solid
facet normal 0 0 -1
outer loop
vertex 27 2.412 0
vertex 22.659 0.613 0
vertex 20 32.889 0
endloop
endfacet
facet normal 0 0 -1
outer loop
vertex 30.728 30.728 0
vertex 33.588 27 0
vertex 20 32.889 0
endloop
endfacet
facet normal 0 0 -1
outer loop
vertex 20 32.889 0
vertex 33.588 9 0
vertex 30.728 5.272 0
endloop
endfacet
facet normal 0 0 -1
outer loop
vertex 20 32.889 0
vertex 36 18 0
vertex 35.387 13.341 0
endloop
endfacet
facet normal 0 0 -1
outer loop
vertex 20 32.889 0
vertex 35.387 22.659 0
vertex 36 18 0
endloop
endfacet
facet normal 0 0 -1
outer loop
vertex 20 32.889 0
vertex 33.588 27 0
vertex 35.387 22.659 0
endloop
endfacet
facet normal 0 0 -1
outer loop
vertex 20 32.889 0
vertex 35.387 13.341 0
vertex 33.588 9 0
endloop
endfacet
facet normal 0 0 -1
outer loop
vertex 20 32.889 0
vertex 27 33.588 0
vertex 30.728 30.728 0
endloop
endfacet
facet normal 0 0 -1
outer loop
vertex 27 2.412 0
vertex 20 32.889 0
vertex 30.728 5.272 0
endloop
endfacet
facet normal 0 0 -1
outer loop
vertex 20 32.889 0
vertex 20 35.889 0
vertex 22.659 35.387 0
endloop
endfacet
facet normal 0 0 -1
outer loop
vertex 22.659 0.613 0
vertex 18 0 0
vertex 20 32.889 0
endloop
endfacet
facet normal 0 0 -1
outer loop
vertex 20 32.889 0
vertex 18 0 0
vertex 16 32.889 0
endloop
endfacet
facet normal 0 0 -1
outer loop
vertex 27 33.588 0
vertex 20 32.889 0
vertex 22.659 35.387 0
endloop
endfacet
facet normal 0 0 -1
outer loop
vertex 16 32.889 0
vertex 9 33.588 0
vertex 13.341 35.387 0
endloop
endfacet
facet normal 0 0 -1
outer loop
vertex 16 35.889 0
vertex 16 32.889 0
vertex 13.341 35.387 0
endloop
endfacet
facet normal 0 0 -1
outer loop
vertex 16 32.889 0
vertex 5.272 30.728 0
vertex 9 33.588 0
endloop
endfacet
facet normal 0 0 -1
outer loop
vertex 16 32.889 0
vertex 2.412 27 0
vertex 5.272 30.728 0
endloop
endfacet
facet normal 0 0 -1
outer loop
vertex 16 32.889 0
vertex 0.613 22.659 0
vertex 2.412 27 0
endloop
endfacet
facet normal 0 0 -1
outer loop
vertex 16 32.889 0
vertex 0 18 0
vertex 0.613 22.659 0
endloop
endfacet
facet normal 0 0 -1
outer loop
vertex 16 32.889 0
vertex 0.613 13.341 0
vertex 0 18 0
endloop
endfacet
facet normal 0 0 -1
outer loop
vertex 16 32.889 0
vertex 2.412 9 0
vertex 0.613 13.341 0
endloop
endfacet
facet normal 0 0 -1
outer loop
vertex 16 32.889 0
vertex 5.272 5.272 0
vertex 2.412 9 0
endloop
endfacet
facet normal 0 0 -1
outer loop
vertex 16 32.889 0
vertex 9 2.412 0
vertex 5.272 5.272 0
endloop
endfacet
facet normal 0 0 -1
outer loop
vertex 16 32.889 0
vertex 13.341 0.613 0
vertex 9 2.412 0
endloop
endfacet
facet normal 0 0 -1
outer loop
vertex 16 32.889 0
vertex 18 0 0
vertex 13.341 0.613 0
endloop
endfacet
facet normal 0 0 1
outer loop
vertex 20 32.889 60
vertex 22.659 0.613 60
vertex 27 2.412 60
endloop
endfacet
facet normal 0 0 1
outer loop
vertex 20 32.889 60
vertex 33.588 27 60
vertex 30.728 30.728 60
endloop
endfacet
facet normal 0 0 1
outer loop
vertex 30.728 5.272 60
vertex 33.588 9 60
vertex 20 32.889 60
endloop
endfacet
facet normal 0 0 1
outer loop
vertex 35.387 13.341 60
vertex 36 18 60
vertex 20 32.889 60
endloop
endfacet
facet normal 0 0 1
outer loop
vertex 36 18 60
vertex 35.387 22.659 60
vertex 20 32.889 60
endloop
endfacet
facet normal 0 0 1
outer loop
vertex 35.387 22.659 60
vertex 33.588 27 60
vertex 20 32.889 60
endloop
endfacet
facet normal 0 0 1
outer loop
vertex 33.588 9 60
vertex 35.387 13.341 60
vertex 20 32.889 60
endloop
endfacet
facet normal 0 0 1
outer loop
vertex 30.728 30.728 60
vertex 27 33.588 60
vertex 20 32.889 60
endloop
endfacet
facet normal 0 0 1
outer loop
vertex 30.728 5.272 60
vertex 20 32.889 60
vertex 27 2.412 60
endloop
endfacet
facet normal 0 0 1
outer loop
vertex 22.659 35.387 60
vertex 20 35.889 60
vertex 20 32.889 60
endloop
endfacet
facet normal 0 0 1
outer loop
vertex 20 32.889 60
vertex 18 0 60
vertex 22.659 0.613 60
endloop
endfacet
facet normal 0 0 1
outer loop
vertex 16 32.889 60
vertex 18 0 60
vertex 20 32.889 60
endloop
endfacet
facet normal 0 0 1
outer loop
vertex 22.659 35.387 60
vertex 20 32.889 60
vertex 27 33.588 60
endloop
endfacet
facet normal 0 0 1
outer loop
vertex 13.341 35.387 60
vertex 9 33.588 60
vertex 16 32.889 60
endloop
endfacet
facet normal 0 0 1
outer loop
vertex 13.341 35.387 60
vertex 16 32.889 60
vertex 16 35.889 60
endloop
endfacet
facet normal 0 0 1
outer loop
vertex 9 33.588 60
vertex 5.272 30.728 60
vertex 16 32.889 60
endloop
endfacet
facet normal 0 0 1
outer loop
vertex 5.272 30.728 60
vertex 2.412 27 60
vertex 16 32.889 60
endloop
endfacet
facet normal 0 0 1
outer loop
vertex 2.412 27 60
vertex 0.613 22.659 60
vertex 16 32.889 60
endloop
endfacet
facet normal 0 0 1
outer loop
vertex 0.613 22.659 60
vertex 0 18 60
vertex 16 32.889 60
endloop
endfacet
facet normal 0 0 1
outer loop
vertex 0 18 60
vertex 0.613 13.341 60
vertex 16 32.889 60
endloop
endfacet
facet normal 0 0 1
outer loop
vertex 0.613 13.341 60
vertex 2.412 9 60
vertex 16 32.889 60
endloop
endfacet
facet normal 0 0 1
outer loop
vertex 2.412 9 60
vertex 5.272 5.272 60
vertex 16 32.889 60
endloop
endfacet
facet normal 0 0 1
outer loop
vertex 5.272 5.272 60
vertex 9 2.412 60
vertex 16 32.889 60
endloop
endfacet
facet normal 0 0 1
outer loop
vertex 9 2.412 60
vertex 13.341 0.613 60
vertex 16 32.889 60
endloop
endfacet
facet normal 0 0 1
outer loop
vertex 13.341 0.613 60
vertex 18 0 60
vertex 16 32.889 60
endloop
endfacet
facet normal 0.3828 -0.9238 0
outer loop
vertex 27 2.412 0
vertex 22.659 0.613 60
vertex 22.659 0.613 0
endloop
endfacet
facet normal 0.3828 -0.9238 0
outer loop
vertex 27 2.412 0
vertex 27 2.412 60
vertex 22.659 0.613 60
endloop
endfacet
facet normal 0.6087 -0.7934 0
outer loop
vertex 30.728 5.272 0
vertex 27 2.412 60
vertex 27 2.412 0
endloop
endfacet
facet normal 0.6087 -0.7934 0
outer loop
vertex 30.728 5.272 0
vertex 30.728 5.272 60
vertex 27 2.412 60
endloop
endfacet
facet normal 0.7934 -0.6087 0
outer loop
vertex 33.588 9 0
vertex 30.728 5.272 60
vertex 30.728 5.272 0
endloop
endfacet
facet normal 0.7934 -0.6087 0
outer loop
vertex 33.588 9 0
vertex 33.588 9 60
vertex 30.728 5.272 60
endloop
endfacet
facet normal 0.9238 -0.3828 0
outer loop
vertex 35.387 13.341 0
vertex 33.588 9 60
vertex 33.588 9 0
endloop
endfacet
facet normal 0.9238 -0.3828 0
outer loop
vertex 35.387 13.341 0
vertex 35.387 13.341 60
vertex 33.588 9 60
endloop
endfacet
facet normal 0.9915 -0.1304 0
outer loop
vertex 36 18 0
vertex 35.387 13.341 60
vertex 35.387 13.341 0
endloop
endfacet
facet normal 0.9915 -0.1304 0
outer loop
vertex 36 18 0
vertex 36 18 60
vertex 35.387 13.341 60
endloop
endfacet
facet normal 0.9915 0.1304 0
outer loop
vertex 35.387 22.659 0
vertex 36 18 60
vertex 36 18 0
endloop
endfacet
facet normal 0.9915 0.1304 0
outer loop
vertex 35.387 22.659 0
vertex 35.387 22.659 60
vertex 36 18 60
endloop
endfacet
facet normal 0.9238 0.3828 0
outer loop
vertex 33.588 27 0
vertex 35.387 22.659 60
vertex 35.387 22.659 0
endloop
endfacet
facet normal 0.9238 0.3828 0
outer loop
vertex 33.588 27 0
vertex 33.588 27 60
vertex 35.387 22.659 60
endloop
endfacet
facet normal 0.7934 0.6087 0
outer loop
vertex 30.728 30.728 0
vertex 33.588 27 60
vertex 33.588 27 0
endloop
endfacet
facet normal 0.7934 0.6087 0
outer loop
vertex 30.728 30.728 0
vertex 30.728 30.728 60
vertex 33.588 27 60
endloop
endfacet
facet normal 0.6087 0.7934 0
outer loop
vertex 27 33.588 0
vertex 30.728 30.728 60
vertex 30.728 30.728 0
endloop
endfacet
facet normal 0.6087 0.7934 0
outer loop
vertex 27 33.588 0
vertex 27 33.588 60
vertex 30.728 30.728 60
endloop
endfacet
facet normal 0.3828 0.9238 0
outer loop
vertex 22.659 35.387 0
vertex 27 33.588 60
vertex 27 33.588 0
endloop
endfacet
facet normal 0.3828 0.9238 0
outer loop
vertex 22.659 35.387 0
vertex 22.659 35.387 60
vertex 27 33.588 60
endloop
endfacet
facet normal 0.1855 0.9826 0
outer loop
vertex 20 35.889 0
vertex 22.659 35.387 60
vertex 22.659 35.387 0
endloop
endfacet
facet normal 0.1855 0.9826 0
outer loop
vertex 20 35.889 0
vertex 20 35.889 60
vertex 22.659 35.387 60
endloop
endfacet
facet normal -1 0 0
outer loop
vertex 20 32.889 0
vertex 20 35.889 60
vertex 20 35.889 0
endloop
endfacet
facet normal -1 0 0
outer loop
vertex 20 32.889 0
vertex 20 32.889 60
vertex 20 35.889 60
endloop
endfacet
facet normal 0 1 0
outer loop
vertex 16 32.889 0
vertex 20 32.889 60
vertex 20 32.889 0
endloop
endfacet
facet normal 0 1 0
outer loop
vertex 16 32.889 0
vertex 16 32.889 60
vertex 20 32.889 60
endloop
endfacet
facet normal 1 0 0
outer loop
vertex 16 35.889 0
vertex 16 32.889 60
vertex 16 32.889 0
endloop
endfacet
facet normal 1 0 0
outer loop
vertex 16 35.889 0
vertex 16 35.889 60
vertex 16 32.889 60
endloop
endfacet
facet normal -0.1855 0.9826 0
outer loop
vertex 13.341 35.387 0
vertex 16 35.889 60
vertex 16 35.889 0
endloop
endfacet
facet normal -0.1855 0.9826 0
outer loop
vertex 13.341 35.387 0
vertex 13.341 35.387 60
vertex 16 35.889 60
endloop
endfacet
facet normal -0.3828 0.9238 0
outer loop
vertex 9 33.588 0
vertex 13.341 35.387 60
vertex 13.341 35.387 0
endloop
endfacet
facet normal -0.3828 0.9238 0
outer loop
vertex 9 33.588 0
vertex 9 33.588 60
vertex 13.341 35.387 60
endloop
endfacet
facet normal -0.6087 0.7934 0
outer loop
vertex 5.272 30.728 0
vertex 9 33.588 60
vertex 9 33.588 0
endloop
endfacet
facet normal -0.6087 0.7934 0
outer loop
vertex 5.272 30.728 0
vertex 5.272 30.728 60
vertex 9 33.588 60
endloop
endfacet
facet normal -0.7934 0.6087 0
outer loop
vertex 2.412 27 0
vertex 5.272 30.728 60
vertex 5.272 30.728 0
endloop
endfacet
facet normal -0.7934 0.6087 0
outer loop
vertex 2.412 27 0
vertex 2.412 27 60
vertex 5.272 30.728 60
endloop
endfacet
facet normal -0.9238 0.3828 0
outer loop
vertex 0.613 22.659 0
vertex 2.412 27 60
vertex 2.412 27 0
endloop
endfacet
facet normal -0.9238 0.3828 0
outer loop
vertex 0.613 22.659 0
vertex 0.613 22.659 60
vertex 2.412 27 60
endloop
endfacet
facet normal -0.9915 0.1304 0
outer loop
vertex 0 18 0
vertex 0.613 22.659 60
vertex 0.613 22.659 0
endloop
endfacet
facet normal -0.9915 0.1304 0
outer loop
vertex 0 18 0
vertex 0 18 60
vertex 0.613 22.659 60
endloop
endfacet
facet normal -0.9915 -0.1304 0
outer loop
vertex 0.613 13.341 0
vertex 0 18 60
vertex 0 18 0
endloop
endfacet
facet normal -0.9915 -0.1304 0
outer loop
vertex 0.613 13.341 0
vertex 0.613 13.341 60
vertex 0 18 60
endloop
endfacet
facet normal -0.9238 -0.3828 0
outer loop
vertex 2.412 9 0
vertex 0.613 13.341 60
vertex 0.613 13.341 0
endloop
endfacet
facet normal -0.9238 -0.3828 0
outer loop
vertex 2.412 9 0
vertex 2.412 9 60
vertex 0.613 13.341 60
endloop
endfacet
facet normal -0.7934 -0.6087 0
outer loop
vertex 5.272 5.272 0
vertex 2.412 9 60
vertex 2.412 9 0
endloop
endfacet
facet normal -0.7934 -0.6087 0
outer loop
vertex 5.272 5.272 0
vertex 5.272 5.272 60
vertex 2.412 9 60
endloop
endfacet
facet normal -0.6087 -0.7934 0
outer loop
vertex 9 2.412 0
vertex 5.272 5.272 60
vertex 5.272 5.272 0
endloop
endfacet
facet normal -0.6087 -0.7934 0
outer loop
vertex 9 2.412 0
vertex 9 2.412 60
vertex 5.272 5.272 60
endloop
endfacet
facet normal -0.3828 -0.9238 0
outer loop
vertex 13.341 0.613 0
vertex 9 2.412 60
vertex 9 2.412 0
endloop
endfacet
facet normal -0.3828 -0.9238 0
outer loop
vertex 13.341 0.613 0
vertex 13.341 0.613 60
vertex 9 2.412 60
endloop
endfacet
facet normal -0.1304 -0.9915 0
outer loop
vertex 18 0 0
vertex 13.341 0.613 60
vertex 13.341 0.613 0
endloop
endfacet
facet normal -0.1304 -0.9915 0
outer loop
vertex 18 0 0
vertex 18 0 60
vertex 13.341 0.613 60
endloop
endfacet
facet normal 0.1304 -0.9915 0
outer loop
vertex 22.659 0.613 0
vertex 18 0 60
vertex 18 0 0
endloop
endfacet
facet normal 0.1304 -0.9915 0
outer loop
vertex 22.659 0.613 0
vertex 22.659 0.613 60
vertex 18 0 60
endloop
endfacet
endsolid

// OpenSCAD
$fn = 32;

// ----------------------------------------------------------------------
// Keyway shaft: d36 shaft, key 4 x 3 mm
// ----------------------------------------------------------------------

// --- parameters (mm) ---
shaft_r = 18;             // shaft radius
key_w = 4;                // keyway width
key_d = 3;                // keyway depth below the surface line
plate_t = 60;             // shaft length, Z (extrusion height)

shaft_d = 2 * shaft_r;  // shaft diameter
circle_step = 15;  // polygon sampling step, degrees

profile = [[13.341, 35.387], [9, 33.588], [5.272, 30.728], [2.412, 27], [0.613, 22.659], [0, 18], [0.613, 13.341], [2.412, 9], [5.272, 5.272], [9, 2.412], [13.341, 0.613], [18, 0], [22.659, 0.613], [27, 2.412], [30.728, 5.272], [33.588, 9], [35.387, 13.341], [36, 18], [35.387, 22.659], [33.588, 27], [30.728, 30.728], [27, 33.588], [22.659, 35.387], [20, 35.889], [20, 32.889], [16, 32.889], [16, 35.889]];  // primary outline, 27 points, counter clockwise

// --- the one profile operation ---
linear_extrude(height = plate_t) polygon(points = profile);
